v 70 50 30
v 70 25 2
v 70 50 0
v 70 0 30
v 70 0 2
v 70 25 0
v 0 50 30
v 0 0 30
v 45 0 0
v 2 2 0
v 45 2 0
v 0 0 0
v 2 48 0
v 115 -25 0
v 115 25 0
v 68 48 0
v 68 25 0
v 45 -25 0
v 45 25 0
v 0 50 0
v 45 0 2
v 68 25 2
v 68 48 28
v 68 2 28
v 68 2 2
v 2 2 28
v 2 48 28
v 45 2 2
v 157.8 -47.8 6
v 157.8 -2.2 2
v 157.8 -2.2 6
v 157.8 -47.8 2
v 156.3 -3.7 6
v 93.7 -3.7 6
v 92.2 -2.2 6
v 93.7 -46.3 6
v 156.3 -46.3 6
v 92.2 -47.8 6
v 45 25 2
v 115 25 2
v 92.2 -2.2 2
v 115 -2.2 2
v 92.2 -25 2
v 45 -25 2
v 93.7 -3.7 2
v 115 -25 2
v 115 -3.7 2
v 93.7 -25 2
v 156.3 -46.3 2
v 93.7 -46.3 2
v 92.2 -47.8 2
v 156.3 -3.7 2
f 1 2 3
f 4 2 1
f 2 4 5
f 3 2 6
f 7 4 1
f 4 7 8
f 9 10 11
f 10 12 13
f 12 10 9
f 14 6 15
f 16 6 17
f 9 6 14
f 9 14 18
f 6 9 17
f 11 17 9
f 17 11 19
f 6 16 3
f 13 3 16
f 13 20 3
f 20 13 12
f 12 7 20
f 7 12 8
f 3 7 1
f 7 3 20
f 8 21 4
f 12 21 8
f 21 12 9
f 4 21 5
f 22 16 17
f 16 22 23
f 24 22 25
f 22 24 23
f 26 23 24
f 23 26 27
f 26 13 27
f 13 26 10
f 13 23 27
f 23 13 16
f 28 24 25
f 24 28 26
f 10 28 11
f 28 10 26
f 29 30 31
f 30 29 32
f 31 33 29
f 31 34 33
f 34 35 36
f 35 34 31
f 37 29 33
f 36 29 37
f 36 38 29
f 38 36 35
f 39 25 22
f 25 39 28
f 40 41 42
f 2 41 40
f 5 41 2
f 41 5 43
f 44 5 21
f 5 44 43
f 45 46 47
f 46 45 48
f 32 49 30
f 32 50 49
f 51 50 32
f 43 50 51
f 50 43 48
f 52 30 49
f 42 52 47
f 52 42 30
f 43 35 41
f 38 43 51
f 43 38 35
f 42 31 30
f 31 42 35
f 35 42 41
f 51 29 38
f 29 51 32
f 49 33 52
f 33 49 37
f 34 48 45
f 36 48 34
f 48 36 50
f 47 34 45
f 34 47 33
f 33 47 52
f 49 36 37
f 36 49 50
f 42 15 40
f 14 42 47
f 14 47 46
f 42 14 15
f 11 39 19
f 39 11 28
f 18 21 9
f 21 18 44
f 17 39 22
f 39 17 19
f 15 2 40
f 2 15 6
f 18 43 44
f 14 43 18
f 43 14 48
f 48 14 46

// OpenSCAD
// Dimensions for the enclosure parts
$fn = 64;

// Part 1: Box (main enclosure)
box_width = 70;        // X
box_depth = 50;      // Y
box_height = 30;       // Z
wall_thickness = 2;      // Wall and floor thickness
floor_thickness = 2;

// Part 2: Lid (printed upside down)
lid_width = 70;      // X
lid_depth = 50;       // Y
lid_thickness = 2;     // Thickness of the lid plate
lip_thickness = 1.5;    // Wall thickness of the lip
lip_height = 4;      // Height of the lip wall
lip_outer_width = 65.6;  // Outer width of lip
lip_outer_depth = 45.6;   // Outer depth of lip

// Spacing between parts
gap = 10;

// Centering the parts on the X axis for both
box_x = -box_width / 2;
box_y = -box_depth / 2;
lid_x = box_x + box_width + gap;
lid_y = -lid_depth / 2;

// --- Box (Part 1) ---
// Outer box dimensions
outer_box = [box_width, box_depth, box_height];

// Inner cavity (to subtract from outer box)
inner_width = box_width - 2 * wall_thickness;
inner_depth = box_depth - 2 * wall_thickness;
inner_height = box_height - floor_thickness;

// Create the box: start with outer cube, subtract inner cavity
difference() {
    // Outer box (with floor)
    cube(outer_box, center = false);
    
    // Inner cavity (with floor removed from top)
    translate([wall_thickness, wall_thickness, 0]) {
        cube([inner_width, inner_depth, box_height - floor_thickness], center = false);
    }
}

// --- Lid (Part 2) ---
// Lid is printed upside down, so we build it with the lip on top
// First, create the flat lid plate
translate([lid_x, lid_y, 0]) {
    // Lid plate (on the bed)
    cube([lid_width, lid_depth, lid_thickness], center = false);
    
    // Lip: a rectangular wall around the inside of the lid
    // Outer lip size: 65.6 x 45.6 mm, centered on lid
    lip_x_offset = (lid_width - lip_outer_width) / 2;
    lip_y_offset = (lid_depth - lip_outer_depth) / 2;
    
    // Create the lip wall (extruded from a rectangle)
    translate([lid_x + lip_x_offset, lid_y + lip_y_offset, lid_thickness]) {
        // Outer rectangle for lip (to cut from)
        difference() {
            // Outer rectangle (larger than inner to allow for clearance)
            cube([lip_outer_width, lip_outer_depth, lip_height], center = false);
            
            // Inner rectangle (to subtract: creates the lip cavity)
            translate([lip_thickness, lip_thickness, 0]) {
                cube([lip_outer_width - 2 * lip_thickness, lip_outer_depth - 2 * lip_thickness, lip_height], center = false);
            }
        }
    }
}
